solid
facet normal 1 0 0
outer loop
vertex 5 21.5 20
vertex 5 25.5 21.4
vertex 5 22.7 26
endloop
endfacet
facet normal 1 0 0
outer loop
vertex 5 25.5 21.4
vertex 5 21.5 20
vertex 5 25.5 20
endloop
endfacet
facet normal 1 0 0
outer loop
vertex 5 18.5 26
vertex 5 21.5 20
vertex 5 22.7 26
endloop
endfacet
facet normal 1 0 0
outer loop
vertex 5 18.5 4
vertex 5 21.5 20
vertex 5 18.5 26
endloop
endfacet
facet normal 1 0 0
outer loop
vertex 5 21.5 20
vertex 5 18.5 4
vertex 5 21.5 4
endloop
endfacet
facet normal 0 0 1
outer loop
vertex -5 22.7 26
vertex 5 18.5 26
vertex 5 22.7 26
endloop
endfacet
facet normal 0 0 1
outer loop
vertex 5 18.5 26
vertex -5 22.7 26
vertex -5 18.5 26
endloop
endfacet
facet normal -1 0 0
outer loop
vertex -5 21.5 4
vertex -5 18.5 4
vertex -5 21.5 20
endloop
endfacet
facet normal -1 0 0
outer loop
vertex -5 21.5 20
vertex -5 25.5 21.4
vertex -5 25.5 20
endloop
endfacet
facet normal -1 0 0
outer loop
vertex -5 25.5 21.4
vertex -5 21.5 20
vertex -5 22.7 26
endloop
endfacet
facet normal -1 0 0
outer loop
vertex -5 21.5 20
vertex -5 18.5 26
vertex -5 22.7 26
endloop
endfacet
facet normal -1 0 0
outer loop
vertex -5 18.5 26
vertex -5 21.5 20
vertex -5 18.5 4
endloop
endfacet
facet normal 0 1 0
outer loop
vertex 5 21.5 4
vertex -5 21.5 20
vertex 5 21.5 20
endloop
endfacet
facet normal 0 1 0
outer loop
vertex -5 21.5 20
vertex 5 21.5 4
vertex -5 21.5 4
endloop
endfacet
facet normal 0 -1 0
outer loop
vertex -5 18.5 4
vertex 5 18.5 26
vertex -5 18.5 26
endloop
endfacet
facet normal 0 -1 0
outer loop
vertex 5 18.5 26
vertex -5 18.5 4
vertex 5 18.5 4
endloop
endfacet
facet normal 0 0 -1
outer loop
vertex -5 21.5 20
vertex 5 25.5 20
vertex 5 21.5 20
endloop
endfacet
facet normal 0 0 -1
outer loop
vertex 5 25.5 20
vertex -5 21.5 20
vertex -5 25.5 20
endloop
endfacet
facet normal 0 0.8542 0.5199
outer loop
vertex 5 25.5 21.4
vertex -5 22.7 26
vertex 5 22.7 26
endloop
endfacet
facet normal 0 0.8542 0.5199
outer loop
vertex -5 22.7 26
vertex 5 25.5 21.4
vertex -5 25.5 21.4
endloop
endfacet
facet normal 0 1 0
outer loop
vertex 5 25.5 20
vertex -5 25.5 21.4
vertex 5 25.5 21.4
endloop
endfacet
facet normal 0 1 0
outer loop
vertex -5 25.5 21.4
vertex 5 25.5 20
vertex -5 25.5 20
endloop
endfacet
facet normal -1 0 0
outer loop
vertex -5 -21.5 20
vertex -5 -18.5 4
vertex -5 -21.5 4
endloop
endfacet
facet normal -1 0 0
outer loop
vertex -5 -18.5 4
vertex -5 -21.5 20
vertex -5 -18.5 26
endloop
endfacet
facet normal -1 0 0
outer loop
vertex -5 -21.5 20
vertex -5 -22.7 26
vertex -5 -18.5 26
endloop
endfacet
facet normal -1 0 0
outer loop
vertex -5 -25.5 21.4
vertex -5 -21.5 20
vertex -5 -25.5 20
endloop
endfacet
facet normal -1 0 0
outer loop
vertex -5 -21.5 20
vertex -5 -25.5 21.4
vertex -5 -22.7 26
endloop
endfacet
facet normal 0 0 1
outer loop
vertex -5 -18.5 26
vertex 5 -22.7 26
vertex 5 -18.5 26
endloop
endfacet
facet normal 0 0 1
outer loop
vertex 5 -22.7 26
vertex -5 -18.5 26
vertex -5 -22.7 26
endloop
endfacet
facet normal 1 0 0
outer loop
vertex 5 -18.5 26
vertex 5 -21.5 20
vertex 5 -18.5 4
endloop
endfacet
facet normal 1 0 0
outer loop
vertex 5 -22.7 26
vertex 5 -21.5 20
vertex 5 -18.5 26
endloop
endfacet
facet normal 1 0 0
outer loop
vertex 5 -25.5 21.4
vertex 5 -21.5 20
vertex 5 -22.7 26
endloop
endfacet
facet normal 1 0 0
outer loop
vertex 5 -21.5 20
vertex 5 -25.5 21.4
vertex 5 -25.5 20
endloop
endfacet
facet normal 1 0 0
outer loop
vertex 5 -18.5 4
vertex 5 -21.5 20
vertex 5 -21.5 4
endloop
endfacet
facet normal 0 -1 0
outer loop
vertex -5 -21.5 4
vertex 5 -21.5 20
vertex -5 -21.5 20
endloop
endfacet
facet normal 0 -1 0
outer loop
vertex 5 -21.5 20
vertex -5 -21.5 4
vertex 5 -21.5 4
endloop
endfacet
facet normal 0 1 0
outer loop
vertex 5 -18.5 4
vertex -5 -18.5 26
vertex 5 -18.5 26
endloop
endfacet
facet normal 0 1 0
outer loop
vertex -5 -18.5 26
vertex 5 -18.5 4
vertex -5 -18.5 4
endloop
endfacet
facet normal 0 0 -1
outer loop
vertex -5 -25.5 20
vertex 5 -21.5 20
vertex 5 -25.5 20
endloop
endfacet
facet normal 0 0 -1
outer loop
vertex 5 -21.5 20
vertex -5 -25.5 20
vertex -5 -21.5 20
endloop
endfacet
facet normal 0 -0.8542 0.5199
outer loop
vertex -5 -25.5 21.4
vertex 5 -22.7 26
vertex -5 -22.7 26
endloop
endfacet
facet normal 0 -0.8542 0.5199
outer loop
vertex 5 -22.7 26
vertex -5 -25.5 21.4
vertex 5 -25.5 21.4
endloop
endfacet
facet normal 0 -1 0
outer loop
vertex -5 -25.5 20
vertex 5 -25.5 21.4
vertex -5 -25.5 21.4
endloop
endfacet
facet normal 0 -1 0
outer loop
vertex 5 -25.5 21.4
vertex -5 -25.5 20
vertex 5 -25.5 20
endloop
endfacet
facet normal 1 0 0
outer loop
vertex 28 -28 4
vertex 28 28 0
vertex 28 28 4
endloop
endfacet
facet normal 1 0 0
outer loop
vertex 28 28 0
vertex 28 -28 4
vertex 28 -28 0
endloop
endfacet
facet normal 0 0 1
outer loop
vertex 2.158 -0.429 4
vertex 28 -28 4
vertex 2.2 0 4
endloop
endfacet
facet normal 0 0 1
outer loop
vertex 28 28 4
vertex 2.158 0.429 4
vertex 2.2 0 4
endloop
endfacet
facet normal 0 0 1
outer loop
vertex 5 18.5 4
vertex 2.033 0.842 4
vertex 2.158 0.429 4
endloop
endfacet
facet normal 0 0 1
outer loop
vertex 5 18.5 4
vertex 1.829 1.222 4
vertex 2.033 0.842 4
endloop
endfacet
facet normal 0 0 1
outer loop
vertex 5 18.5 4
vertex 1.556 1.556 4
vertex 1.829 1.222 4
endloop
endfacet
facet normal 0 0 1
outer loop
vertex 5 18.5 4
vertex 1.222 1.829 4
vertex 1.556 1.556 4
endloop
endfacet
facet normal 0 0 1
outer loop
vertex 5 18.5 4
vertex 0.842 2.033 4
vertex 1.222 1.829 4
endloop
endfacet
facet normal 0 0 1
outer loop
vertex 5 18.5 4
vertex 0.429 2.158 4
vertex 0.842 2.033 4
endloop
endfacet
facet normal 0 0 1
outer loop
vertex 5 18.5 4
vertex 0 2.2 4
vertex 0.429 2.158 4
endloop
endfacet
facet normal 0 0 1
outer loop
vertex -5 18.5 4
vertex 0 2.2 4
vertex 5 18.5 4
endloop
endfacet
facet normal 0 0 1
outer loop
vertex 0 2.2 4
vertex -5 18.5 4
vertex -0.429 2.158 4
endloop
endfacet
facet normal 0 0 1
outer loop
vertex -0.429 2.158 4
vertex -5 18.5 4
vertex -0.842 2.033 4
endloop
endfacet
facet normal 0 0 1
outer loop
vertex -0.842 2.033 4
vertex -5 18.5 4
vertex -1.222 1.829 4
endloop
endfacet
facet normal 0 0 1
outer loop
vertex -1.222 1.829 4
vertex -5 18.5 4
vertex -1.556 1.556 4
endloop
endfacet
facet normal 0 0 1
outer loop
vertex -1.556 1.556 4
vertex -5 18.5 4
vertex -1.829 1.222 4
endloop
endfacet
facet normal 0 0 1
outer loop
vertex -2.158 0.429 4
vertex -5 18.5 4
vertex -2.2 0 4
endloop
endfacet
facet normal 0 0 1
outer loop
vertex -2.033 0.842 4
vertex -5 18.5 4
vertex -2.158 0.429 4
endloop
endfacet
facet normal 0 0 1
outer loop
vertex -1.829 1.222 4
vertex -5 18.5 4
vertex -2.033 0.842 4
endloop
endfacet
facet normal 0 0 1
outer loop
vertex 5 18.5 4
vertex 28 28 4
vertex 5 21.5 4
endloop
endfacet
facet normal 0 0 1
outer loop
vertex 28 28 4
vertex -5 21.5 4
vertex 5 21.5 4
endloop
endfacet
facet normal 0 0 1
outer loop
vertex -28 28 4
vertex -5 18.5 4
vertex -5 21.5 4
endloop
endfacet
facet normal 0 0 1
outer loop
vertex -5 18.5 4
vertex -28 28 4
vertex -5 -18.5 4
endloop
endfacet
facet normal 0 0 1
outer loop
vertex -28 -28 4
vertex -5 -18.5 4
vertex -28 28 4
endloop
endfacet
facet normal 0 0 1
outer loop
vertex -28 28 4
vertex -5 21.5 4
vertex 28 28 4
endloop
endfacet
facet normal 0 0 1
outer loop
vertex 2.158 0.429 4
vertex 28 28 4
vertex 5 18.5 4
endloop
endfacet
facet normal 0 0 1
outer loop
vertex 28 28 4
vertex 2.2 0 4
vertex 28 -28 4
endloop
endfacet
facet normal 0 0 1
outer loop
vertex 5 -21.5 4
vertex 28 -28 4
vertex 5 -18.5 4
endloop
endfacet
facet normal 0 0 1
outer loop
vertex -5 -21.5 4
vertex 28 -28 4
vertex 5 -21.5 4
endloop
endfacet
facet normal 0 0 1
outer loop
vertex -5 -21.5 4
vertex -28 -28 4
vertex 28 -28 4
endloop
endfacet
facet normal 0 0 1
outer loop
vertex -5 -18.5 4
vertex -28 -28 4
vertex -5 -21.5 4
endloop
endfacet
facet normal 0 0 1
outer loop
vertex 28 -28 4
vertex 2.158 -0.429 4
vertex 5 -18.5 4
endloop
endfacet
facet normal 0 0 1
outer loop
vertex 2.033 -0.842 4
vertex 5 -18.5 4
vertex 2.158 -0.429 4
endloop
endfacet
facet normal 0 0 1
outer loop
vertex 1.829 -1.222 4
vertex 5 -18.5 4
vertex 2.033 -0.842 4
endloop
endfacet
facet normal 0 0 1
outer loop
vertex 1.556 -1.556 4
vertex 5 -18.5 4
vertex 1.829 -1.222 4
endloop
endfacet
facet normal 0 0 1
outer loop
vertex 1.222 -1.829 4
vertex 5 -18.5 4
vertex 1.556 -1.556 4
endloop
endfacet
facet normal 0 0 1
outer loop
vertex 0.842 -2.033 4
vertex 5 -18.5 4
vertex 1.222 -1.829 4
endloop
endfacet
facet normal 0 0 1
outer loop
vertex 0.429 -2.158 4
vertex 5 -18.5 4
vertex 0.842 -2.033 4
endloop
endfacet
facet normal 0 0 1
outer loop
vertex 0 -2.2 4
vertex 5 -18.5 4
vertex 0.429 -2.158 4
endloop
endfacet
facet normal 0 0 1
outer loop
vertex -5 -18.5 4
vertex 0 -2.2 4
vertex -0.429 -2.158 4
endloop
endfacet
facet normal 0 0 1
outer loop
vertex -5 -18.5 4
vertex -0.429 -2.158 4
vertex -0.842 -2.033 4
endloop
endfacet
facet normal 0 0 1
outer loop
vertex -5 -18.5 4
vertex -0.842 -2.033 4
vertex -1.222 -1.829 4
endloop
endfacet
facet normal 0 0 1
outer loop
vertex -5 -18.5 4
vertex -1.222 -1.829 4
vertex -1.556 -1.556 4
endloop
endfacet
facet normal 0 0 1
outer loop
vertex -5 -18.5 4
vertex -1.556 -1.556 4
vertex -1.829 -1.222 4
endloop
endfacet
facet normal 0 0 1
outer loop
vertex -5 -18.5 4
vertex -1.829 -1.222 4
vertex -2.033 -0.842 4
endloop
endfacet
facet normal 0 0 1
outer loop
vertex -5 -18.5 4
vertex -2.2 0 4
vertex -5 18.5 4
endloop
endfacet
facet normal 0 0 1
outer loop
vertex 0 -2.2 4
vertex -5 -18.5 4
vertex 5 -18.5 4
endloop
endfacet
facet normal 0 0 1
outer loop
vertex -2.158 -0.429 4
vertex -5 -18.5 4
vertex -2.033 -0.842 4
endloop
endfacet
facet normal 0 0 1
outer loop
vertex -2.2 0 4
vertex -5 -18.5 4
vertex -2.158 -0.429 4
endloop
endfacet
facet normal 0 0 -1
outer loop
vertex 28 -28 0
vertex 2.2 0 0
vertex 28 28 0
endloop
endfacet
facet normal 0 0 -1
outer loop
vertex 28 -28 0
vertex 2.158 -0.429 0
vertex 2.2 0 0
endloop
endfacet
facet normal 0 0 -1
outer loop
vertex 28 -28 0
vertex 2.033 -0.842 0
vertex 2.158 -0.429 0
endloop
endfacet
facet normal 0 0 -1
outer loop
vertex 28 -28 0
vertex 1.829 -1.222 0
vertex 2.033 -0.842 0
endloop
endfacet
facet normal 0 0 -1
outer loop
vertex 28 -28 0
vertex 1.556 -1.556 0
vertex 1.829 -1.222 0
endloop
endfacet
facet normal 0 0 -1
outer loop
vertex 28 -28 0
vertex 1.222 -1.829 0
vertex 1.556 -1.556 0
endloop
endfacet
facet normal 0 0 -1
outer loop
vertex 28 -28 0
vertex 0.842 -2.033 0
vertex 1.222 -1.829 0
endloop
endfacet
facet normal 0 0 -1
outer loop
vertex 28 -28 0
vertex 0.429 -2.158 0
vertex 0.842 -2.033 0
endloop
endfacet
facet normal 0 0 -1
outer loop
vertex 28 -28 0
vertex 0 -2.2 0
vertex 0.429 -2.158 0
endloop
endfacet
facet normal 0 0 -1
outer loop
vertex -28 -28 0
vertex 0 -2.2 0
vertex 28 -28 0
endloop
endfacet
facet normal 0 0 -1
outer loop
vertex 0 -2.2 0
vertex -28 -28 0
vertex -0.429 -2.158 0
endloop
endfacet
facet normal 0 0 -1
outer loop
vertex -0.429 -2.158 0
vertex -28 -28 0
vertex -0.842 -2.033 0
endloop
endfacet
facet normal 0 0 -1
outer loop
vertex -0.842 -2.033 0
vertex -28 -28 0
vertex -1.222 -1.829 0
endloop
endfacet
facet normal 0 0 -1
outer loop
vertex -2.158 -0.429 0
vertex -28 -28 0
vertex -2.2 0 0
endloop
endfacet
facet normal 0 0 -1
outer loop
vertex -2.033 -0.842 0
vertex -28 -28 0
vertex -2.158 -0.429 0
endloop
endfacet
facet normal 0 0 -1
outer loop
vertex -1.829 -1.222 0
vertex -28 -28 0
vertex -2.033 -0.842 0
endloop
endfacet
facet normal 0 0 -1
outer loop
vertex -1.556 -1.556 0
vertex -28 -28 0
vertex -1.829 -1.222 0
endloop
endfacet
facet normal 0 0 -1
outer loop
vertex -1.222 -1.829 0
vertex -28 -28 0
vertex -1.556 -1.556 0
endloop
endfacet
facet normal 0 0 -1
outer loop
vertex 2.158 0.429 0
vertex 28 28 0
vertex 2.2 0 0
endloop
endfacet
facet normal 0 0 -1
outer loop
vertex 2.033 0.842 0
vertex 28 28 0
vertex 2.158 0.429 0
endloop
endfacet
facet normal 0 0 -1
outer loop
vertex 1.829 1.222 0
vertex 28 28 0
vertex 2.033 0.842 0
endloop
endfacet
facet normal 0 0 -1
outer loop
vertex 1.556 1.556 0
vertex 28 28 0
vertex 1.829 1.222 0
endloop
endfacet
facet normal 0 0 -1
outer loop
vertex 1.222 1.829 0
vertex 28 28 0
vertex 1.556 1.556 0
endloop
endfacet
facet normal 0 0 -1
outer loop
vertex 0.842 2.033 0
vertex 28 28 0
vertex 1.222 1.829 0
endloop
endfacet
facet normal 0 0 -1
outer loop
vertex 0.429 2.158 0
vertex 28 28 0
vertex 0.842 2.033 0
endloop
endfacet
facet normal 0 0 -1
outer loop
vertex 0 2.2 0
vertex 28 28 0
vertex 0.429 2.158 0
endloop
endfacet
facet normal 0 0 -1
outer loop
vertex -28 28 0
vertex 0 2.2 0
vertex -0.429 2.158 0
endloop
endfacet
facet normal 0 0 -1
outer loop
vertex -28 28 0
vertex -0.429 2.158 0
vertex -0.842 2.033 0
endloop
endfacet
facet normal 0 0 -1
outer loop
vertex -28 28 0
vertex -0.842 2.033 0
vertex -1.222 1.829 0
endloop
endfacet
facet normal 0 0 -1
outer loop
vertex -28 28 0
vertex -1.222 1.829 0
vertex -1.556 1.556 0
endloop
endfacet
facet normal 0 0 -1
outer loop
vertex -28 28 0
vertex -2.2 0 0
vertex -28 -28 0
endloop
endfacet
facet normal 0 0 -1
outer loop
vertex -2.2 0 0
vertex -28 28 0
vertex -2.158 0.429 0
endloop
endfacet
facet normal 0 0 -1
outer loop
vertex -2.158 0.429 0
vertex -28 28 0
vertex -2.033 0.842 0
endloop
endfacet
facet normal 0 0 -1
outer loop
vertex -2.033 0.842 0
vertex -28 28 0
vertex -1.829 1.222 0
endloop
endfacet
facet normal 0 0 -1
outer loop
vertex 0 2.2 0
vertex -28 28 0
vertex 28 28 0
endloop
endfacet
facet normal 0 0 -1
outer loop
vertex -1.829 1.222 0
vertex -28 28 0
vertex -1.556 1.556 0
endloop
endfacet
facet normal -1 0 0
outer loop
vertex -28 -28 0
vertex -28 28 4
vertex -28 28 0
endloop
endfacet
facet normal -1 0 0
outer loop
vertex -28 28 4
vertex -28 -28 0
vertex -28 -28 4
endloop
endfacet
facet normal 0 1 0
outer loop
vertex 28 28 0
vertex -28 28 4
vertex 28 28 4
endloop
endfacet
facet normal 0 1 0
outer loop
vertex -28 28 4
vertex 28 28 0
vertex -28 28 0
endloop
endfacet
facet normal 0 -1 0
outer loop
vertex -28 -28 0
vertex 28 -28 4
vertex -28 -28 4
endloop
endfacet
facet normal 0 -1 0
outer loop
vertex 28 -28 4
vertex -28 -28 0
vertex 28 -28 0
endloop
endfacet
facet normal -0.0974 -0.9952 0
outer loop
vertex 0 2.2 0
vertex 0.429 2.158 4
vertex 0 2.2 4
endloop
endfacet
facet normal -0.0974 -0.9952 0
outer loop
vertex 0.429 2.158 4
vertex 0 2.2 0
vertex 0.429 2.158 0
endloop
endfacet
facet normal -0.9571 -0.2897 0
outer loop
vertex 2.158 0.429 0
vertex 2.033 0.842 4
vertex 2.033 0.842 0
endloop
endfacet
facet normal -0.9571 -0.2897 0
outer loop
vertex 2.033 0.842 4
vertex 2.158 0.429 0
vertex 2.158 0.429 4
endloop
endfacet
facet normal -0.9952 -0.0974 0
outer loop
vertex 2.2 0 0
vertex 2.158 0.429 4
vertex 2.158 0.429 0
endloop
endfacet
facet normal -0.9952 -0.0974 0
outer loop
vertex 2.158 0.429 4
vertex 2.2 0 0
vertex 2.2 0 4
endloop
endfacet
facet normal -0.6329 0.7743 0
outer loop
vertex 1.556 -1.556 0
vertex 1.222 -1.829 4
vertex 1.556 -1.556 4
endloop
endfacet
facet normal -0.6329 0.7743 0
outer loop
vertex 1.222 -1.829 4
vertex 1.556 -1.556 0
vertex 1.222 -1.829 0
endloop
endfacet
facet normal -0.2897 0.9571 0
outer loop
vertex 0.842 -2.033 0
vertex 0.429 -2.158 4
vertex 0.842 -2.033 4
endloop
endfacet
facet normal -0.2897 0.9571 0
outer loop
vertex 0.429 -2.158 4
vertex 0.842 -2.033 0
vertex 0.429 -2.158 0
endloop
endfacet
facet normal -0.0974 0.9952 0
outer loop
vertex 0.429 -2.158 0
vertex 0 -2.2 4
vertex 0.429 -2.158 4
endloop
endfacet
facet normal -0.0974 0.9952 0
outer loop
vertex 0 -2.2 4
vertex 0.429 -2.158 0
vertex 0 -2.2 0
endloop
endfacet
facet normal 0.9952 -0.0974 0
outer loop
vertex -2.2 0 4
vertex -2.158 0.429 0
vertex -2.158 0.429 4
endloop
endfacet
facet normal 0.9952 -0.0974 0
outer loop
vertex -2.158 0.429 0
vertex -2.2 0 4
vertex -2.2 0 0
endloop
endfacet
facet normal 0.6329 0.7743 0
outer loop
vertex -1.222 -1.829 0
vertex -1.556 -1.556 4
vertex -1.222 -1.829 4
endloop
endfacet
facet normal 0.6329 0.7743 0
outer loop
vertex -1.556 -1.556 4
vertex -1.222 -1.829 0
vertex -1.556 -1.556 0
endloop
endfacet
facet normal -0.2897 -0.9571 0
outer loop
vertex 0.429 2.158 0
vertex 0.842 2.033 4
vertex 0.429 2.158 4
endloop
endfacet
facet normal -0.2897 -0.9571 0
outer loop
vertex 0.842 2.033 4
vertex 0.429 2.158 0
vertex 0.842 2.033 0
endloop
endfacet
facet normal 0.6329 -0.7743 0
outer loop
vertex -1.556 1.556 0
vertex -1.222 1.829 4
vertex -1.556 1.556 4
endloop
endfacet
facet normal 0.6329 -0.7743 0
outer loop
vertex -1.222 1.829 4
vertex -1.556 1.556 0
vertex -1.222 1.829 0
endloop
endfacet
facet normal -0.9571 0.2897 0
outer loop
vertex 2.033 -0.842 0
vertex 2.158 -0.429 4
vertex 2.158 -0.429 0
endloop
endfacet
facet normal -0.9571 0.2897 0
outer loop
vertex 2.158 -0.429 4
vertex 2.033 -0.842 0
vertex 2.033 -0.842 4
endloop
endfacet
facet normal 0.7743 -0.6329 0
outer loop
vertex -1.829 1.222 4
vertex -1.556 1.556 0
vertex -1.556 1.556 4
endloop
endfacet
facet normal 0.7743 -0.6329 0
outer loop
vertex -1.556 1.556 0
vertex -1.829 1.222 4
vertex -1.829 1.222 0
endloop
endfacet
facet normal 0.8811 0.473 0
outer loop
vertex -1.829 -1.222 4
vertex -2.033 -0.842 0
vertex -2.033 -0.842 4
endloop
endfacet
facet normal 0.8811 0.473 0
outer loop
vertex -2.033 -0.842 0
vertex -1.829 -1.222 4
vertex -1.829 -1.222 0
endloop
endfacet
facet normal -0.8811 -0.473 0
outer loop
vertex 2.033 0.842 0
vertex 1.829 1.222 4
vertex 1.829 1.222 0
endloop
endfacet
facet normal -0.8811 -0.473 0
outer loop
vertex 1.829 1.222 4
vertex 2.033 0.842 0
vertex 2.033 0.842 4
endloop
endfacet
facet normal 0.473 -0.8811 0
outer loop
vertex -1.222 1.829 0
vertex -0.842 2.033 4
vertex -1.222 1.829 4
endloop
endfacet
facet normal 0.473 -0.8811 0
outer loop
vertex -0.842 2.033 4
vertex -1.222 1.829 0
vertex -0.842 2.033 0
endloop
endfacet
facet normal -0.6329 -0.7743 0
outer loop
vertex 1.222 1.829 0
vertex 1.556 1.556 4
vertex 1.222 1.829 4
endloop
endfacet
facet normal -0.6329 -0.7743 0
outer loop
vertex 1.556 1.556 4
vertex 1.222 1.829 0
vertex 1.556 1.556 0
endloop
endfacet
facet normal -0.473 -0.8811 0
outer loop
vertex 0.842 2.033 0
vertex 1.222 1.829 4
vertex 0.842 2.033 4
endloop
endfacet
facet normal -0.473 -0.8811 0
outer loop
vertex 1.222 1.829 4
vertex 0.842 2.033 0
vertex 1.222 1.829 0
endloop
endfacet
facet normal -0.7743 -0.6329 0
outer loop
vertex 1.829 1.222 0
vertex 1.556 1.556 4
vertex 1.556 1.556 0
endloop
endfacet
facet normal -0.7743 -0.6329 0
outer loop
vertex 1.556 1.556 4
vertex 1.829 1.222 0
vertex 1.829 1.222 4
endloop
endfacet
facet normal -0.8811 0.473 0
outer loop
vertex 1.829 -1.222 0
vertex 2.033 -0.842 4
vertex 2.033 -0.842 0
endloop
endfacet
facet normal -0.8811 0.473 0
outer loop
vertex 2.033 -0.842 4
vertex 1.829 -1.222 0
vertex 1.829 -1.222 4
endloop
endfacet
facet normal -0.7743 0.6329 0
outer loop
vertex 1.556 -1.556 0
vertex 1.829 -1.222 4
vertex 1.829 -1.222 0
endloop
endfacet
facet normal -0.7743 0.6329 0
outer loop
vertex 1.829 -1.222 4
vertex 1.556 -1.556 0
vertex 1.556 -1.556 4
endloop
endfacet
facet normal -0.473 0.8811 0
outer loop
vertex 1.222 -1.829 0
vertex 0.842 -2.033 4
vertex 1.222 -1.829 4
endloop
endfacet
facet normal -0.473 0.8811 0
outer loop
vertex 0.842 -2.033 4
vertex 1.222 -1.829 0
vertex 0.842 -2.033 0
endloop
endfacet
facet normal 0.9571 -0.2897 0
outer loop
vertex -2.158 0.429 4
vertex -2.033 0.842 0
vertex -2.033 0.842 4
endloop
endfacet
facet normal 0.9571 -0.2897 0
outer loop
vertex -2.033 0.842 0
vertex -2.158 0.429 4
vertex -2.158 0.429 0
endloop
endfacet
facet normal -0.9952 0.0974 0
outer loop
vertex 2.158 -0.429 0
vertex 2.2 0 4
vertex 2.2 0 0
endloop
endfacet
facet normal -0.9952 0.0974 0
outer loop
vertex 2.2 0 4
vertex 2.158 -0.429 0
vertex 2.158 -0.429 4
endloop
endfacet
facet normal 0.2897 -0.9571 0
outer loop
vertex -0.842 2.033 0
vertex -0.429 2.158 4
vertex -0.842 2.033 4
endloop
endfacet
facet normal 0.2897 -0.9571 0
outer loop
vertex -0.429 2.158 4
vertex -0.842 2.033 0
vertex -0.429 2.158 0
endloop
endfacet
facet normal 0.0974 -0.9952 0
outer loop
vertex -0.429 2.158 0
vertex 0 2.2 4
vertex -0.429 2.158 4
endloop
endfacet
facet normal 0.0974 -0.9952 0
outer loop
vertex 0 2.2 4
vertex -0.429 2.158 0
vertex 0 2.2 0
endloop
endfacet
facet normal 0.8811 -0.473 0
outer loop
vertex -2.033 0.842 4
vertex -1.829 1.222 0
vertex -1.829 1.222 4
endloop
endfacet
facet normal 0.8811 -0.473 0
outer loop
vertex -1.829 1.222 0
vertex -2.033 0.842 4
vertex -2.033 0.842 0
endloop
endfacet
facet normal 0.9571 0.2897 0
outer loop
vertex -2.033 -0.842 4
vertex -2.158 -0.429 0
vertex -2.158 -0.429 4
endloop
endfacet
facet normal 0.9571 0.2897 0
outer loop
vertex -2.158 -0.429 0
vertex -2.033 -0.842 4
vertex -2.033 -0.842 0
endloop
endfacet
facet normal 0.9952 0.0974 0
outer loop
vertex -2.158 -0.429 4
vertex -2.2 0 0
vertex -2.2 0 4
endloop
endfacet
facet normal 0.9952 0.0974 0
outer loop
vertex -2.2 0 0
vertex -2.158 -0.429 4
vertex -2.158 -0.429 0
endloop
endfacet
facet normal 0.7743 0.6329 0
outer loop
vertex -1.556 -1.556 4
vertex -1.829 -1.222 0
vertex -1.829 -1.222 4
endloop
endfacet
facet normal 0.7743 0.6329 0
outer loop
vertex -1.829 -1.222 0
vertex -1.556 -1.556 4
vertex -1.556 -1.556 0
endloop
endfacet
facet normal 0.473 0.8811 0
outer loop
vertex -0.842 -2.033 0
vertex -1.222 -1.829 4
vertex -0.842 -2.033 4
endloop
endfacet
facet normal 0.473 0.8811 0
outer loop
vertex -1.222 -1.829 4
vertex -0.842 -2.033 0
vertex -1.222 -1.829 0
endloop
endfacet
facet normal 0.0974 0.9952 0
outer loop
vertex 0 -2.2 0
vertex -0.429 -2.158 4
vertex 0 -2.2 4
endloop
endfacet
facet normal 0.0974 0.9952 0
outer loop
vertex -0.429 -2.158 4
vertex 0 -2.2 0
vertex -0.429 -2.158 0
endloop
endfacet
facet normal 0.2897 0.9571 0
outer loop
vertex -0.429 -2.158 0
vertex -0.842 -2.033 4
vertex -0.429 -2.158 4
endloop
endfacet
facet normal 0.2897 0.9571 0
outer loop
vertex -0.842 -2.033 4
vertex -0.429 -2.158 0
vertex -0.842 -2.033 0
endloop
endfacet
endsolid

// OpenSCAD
$fn = 32;

// ----------------------------------------------------------------------
// Snap-fit latch: 2 arms, 22 mm tall, 4.2 mm undercut hooks
// ----------------------------------------------------------------------

// --- parameters (mm) ---
base_d = 56;              // base plate depth
base_h = 4;               // base plate thickness
span = 40;                // distance between opposite arms
arm_t = 3;                // arm thickness
arm_d = 10;               // arm width
height = 22;              // free arm length
head_len = 4.2;           // hook reach
head_h = 6;               // hook height
lead = 1.4;               // lead-in ramp thickness
bore_d = 4.4;             // base fixing bore
top_z = 26;               // height of the arm tips above the base

arms = 2;

difference() {
  union() {
    /* base plate, centred on the arm ring */
    translate([-28, -28, 0]) cube([base_d, base_d, base_h]);
    for (a = [0 : 360 / arms : 359]) rotate([0, 0, a]) {
    /* arm, sunk 0.5 mm into the base */
    translate([-arm_d / 2, span / 2 - arm_t / 2, base_h - 0.5]) cube([arm_d, arm_t, height + 0.5]);
    /* hook: a convex hull of a tall inner block and a thin outer lip
       gives a flat undercut below and a lead-in ramp on top */
    hull() {
      translate([-arm_d / 2, span / 2 + arm_t / 2 - 0.6, top_z - head_h]) cube([arm_d, lead + 0.4, head_h]);
      translate([-arm_d / 2, span / 2 + arm_t / 2 - 0.2, top_z - head_h]) cube([arm_d, head_len, lead]);
    }
    }
  }
  translate([0, 0, -2.5]) cylinder(h = base_h + 5, d = bore_d);
}
